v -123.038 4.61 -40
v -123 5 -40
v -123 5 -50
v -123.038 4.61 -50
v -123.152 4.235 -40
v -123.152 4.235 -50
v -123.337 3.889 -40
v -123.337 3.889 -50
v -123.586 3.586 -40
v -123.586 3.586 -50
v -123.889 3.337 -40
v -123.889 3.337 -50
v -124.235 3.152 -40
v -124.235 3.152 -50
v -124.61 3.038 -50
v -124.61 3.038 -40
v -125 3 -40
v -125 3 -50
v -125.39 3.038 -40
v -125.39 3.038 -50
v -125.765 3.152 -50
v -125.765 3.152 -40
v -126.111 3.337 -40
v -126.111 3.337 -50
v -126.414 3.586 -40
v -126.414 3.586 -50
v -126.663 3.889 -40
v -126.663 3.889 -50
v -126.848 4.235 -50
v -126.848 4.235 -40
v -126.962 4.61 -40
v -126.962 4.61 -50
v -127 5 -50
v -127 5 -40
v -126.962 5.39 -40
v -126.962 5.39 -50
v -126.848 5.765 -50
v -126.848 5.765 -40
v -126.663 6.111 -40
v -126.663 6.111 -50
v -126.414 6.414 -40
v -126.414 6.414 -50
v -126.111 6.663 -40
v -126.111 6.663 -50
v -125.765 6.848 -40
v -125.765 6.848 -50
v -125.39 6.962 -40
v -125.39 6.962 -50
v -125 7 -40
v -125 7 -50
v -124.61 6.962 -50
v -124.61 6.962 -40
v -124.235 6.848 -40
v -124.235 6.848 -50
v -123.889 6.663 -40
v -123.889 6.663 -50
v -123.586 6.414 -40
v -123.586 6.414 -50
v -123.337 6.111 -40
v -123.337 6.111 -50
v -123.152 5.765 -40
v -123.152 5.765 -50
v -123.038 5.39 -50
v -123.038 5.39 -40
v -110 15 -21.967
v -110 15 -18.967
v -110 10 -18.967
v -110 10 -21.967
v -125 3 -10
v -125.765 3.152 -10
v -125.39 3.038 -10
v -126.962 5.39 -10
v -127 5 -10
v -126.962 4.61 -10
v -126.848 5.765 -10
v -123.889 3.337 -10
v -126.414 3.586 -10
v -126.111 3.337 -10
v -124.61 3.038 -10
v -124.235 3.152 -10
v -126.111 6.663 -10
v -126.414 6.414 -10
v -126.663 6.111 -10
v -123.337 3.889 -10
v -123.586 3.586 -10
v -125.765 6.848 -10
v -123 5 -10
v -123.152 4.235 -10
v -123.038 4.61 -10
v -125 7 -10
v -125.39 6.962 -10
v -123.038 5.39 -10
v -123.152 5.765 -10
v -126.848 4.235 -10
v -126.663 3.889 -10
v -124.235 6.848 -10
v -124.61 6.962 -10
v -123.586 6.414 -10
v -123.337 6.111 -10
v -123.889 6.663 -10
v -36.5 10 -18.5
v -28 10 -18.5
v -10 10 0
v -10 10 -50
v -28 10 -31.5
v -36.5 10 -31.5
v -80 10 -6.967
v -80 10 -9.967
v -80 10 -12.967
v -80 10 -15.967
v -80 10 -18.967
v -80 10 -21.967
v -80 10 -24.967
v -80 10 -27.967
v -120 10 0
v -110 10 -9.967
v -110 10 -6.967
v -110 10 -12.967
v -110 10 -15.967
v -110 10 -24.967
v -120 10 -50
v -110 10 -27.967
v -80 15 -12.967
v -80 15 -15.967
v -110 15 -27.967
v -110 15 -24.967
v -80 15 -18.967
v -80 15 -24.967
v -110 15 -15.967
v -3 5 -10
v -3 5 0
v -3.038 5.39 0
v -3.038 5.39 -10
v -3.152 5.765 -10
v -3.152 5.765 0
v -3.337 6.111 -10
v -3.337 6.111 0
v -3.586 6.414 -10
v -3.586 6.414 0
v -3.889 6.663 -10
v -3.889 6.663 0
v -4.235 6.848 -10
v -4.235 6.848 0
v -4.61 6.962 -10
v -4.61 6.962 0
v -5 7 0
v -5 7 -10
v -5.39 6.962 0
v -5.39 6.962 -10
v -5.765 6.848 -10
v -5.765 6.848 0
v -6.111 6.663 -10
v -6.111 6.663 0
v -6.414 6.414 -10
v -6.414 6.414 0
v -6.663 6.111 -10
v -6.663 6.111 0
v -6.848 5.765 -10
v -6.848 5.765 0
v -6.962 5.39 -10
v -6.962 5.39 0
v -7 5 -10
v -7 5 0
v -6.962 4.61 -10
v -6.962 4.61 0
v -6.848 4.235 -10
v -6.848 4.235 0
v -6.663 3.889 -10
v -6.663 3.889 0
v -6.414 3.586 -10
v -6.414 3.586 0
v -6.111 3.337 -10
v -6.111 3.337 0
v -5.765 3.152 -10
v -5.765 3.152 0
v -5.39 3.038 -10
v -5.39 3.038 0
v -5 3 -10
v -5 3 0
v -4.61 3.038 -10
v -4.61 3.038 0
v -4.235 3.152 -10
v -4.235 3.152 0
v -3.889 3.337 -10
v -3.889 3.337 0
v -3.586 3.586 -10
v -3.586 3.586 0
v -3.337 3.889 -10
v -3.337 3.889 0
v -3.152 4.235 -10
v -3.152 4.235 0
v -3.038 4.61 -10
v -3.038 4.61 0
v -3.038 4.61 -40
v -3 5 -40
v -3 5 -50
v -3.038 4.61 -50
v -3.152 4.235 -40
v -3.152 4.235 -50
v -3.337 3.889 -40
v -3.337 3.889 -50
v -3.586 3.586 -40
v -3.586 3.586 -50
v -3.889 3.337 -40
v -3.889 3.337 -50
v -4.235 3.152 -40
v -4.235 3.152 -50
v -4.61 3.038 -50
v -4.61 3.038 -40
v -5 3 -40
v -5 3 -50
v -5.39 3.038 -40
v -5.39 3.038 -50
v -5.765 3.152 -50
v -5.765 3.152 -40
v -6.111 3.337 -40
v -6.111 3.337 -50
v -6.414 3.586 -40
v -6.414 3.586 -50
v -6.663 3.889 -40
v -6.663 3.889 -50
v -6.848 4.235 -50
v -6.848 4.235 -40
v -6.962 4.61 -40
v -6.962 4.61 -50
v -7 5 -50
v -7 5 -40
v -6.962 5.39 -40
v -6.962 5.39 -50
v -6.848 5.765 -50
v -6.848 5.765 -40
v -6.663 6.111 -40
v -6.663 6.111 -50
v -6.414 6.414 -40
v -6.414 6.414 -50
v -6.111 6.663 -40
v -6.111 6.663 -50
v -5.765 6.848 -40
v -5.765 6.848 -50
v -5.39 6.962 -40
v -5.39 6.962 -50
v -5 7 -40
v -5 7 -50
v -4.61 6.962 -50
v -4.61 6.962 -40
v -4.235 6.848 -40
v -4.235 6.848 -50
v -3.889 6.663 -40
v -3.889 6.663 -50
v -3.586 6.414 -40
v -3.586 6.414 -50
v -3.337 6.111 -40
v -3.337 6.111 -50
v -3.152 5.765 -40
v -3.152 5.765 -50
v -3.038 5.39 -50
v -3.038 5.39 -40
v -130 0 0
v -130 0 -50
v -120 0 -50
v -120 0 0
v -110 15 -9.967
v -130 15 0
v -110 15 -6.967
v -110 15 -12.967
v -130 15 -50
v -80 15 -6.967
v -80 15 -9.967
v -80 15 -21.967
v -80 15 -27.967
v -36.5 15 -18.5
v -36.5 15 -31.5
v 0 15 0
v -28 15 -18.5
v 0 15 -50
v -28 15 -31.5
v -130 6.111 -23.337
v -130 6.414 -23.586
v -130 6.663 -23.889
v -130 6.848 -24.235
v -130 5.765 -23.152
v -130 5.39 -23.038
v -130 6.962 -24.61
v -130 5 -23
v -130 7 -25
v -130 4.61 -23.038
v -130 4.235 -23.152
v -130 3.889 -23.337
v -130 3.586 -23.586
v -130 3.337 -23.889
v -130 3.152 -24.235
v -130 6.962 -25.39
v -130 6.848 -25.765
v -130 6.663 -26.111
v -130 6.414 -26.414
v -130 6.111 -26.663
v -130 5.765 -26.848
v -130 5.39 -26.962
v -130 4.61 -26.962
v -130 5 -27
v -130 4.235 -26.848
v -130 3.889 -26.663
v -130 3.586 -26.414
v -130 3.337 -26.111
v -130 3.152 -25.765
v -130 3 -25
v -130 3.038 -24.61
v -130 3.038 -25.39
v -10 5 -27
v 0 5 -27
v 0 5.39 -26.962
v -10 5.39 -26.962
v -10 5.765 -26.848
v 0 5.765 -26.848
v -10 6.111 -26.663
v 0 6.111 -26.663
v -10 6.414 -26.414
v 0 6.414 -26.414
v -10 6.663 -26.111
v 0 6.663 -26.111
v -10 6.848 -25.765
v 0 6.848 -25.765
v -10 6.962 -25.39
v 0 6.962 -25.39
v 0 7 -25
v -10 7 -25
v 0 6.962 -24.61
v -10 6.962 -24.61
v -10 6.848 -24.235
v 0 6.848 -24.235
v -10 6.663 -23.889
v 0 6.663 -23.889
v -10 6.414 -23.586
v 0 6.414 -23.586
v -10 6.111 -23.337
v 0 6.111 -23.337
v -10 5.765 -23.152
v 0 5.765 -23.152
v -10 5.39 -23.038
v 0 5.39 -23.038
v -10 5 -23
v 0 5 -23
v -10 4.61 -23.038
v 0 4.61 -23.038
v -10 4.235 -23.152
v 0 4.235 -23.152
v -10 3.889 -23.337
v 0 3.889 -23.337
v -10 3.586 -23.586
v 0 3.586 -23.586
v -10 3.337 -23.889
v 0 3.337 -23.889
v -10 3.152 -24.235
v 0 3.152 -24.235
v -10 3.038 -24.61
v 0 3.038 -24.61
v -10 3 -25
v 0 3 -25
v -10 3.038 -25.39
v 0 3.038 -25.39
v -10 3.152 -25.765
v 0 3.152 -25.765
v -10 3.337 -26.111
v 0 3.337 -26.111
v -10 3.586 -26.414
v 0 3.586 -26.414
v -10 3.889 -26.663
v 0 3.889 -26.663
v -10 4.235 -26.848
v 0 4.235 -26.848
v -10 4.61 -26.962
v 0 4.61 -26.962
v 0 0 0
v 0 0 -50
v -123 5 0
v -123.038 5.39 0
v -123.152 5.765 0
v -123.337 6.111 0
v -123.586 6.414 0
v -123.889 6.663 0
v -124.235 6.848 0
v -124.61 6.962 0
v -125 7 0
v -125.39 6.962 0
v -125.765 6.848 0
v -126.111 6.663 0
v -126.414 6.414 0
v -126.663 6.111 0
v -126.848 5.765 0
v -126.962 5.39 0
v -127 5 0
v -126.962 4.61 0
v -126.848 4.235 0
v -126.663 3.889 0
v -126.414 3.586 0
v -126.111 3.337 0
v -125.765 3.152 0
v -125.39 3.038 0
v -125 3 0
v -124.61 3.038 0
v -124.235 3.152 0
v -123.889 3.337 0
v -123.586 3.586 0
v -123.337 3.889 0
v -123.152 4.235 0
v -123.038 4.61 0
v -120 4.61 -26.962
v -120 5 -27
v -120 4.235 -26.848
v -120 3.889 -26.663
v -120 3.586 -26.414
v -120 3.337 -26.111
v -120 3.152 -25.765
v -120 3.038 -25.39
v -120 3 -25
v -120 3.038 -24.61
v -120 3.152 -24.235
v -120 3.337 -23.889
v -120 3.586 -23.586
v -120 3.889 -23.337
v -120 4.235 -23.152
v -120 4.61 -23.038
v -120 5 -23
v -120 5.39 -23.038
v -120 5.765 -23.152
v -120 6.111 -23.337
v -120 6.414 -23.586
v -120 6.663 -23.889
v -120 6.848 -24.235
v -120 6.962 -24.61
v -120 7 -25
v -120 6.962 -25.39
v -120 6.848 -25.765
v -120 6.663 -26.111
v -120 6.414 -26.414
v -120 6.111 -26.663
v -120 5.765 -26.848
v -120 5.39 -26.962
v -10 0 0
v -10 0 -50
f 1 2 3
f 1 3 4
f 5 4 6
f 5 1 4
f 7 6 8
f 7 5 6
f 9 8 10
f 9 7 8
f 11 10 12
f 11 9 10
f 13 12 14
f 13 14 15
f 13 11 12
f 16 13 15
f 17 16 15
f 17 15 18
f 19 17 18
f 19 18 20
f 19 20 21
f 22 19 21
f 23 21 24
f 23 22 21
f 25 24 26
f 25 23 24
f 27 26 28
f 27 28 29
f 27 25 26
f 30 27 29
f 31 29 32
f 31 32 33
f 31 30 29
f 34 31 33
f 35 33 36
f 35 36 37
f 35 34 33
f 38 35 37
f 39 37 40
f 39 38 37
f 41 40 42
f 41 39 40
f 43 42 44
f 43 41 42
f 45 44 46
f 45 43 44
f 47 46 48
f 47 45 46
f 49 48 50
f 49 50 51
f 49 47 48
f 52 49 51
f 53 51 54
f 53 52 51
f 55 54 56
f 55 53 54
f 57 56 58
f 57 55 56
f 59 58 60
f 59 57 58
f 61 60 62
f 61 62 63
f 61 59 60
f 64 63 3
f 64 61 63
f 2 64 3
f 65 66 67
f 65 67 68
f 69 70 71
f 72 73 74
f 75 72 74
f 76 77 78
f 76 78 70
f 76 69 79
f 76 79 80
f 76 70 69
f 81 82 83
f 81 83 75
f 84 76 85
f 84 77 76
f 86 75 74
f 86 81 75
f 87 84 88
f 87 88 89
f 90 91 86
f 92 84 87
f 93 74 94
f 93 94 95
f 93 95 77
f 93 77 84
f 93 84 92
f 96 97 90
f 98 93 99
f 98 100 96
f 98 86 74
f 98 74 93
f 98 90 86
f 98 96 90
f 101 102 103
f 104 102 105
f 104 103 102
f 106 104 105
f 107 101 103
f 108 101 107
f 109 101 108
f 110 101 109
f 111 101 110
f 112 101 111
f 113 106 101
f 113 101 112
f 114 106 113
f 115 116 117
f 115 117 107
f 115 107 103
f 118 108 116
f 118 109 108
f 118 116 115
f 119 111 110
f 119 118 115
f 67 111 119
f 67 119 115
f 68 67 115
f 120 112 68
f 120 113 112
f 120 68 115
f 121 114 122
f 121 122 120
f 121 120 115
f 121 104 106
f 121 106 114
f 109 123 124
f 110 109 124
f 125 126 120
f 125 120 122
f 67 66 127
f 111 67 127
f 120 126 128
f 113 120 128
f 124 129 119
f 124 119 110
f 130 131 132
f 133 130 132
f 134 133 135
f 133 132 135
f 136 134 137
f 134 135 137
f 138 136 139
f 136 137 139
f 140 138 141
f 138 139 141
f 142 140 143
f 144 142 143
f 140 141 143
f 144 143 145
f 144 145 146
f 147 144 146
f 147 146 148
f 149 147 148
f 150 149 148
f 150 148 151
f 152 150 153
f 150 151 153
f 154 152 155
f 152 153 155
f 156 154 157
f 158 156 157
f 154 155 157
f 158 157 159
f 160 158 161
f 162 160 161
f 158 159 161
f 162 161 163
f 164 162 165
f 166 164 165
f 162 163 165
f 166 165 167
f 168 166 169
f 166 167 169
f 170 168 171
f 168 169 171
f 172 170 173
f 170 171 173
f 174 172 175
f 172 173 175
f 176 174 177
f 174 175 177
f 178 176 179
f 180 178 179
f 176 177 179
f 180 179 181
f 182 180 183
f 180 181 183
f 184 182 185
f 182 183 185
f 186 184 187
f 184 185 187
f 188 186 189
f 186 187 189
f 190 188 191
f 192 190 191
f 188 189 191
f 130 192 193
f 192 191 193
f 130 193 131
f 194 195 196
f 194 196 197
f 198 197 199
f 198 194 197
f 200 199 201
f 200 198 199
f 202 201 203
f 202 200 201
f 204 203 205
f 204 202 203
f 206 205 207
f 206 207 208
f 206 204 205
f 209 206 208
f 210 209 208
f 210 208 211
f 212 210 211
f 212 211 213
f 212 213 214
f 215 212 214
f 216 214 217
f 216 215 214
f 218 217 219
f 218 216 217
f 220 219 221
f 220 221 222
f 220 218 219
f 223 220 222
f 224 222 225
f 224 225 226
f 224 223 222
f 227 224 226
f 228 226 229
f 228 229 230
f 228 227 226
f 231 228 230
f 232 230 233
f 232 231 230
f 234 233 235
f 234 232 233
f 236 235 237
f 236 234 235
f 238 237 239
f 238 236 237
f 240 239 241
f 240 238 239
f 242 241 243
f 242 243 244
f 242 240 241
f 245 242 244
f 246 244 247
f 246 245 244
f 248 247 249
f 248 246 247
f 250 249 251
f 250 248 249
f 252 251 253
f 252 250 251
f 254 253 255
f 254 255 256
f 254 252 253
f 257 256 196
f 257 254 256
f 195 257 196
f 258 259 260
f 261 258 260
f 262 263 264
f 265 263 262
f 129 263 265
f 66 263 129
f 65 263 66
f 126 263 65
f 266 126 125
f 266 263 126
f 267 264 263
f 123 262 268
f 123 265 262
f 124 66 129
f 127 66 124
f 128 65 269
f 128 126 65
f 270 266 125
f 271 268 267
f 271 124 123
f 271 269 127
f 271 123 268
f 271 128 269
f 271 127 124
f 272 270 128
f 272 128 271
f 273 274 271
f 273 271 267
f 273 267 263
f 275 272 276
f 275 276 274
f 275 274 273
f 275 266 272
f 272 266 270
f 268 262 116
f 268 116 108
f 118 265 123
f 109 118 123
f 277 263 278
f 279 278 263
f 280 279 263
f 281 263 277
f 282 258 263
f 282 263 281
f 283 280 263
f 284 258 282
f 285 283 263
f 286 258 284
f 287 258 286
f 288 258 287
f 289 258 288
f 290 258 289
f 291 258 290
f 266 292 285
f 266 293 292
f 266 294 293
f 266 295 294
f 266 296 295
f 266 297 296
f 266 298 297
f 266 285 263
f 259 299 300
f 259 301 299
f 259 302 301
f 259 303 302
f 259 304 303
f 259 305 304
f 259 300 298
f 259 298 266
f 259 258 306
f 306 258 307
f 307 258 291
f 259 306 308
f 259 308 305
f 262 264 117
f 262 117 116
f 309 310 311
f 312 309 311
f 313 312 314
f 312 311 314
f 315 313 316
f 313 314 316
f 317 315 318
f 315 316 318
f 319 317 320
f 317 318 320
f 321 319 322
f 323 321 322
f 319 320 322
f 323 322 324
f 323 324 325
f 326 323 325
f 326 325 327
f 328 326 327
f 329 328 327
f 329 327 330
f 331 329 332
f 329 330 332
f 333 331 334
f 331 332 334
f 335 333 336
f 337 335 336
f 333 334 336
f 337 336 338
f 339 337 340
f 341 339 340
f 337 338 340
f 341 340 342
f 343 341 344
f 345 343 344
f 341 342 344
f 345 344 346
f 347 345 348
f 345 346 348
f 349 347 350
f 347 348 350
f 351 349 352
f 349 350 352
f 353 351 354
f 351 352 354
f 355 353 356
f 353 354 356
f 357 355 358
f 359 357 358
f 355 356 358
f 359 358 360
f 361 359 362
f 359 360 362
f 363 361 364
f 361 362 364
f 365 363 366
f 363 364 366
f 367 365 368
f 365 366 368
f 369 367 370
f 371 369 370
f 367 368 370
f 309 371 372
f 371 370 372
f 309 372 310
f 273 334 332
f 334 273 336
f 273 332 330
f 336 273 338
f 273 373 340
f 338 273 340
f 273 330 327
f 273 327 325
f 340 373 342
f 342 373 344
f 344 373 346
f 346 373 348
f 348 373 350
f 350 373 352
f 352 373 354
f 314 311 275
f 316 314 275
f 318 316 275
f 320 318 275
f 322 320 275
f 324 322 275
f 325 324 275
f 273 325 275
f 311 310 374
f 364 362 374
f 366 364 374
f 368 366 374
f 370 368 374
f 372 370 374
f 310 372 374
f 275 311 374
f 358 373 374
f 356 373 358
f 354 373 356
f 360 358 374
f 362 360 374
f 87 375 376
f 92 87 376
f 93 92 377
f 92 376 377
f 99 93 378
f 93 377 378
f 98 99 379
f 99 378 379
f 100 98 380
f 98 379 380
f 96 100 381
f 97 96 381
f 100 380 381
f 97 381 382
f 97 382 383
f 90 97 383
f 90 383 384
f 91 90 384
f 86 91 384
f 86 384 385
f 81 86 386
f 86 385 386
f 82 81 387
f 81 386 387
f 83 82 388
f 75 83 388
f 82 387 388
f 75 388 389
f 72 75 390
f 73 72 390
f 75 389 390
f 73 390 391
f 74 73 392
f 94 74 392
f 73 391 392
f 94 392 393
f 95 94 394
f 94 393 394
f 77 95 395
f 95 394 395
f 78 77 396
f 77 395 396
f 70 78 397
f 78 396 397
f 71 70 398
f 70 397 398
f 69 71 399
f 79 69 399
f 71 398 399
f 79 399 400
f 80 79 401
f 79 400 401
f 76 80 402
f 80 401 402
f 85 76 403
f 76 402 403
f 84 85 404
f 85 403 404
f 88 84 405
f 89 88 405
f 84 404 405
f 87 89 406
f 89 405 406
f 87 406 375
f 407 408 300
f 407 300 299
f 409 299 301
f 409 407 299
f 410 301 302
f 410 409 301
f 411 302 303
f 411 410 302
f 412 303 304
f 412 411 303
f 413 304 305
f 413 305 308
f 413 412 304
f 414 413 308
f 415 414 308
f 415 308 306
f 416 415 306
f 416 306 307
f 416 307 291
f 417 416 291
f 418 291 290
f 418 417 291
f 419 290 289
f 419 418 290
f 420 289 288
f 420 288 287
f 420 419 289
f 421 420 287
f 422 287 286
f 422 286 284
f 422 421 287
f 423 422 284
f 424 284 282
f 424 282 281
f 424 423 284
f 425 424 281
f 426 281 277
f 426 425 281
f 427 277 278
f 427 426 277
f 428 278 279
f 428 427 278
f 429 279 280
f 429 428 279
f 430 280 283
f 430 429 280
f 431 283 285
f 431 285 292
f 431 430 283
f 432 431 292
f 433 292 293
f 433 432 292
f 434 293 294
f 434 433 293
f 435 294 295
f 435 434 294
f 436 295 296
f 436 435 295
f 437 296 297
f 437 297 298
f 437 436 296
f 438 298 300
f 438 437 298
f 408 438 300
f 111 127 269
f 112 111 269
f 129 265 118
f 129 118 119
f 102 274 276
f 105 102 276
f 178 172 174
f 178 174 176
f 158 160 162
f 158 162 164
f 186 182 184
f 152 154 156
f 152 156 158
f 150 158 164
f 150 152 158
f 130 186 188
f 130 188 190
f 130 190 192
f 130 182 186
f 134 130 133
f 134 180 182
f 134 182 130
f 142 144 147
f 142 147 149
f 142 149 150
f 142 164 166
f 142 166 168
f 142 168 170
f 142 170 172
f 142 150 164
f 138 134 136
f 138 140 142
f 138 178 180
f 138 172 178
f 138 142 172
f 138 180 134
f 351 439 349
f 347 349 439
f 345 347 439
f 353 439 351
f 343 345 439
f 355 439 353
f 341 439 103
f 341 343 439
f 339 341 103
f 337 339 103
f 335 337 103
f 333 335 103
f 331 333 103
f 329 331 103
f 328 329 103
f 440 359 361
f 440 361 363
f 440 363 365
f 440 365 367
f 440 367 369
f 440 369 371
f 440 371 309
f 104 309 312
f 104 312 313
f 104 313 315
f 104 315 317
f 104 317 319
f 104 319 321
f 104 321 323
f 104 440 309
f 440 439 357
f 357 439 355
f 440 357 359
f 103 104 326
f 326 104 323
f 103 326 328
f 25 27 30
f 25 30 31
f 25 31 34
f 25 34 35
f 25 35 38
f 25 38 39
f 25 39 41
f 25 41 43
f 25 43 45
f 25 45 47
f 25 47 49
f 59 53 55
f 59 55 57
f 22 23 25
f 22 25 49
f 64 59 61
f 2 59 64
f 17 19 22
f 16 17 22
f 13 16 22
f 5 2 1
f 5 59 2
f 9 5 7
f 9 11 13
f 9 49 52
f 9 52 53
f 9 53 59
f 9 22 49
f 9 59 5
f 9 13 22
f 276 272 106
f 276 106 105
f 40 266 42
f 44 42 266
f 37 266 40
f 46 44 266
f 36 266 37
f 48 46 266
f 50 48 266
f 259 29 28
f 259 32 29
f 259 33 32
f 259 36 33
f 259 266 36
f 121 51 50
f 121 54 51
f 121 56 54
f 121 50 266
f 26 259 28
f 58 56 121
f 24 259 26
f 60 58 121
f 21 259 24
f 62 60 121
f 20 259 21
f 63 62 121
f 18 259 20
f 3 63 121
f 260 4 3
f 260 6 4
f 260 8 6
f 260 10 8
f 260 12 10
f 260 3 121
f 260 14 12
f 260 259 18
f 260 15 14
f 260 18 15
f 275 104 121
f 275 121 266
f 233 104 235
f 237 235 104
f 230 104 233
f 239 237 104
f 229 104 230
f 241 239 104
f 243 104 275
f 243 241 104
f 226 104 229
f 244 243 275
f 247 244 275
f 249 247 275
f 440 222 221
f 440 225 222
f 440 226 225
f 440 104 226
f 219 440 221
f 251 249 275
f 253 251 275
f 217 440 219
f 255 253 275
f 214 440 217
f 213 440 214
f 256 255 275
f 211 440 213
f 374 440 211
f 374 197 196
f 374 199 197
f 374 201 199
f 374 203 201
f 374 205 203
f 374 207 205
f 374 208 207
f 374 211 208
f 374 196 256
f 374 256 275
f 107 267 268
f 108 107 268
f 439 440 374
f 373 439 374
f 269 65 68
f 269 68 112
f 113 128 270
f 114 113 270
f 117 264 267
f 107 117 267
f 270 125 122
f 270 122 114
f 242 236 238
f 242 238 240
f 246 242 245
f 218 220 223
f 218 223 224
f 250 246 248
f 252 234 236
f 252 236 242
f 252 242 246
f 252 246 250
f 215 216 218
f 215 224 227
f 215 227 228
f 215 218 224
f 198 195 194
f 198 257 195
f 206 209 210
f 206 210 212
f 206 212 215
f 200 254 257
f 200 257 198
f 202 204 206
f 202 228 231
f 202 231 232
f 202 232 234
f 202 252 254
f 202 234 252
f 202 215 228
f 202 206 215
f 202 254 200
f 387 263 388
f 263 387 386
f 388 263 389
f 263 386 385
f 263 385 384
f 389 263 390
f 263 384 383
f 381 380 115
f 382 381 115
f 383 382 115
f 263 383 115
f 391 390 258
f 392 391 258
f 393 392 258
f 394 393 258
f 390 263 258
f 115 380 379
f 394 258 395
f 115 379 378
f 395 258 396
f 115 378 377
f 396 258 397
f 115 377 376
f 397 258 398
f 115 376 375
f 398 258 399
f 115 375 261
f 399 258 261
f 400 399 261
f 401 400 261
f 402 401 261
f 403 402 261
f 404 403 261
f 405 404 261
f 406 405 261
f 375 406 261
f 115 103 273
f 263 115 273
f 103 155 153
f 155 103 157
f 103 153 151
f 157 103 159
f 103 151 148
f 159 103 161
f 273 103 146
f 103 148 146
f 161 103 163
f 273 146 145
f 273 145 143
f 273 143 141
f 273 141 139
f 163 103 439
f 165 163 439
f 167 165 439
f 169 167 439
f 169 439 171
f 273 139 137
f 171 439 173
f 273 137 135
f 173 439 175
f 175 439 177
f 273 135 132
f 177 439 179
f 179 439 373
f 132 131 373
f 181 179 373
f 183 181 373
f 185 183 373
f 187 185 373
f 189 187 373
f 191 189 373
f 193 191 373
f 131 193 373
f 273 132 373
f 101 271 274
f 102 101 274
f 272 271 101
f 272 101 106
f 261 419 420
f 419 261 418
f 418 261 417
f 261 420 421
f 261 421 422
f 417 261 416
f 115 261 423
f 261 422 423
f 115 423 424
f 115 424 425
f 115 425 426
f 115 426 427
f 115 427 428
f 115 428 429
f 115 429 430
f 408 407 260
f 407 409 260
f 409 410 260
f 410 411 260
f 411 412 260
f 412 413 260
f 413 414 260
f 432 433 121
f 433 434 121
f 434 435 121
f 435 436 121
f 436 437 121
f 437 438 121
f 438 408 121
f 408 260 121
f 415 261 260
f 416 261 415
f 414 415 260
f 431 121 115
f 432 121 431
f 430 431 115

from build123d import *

# Parameters (mm, degrees)
ESBO_O1_W                = 130
ESBO_O1_H                = 50
RESSALTO_EXTRUS_O1_DEPTH = 15
ESBO_O2_W                = 110
ESBO_O2_H                = 10
CORTE_EXTRUS_O1_DEPTH    = 51
ESBO_O12_R               = 2
CORTE_EXTRUS_O8_DEPTH    = 10
CORTE_EXTRUS_O9_START    = -10
ESBO_O14_R               = 2
CORTE_EXTRUS_O9_DEPTH    = 10
ESBO_O7_R                = 2
CORTE_EXTRUS_O11_DEPTH   = 10
CORTE_EXTRUS_O12_START   = -10
ESBO_O6_R                = 2
CORTE_EXTRUS_O12_DEPTH   = 10
ESBO_O23_W               = 8.5
ESBO_O23_H               = 13
CORTE_EXTRUS_O13_DEPTH   = 10
ESBO_O20_W               = 30
ESBO_O20_H               = 3
CORTE_EXTRUS_O14_DEPTH   = 10


with BuildPart() as part:
    # Esboço1 → Ressalto-extrusão1 (new body)
    with BuildSketch(Plane(origin=(0, 0, 0), x_dir=(1, 0, 0), z_dir=(0, 1, 0))):
        with Locations((-65, 25)):
            Rectangle(ESBO_O1_W, ESBO_O1_H)
    extrude(amount=RESSALTO_EXTRUS_O1_DEPTH)

    # Esboço2 → Corte-extrusão1 (cut)
    with BuildSketch(Plane(origin=(0, 0, -50), x_dir=(-1, 0, 0), z_dir=(0, 0, -1))):
        with Locations((65, 5)):
            Rectangle(ESBO_O2_W, ESBO_O2_H)
    extrude(amount=-CORTE_EXTRUS_O1_DEPTH, mode=Mode.SUBTRACT)

    # Esboço12 → Corte-extrusão8 (cut)
    with BuildSketch(Plane(origin=(0, 0, 0), x_dir=(0, 0, -1), z_dir=(1, 0, 0))):
        with Locations((25, 5)):
            Circle(ESBO_O12_R)
    extrude(amount=-CORTE_EXTRUS_O8_DEPTH, mode=Mode.SUBTRACT)

    # Esboço14 → Corte-extrusão9 (cut)
    with BuildSketch(Plane.ZY.offset(130).offset(CORTE_EXTRUS_O9_START)):
        with Locations(Location((-25, 5, 0), (0, 0, 180))):
            Circle(ESBO_O14_R)
    extrude(amount=CORTE_EXTRUS_O9_DEPTH, mode=Mode.SUBTRACT)

    # Esboço7 → Corte-extrusão11 (cut)
    with BuildSketch(Plane.XY):
        with Locations((-5, 5)):
            Circle(ESBO_O7_R)
        with Locations((-125, 5)):
            Circle(ESBO_O7_R)
    extrude(amount=-CORTE_EXTRUS_O11_DEPTH, mode=Mode.SUBTRACT)

    # Esboço6 → Corte-extrusão12 (cut)
    with BuildSketch(Plane(origin=(0, 0, -50), x_dir=(-1, 0, 0), z_dir=(0, 0, -1)).offset(CORTE_EXTRUS_O12_START)):
        with Locations(Location((5, 5, 0), (0, 0, 180))):
            Circle(ESBO_O6_R)
        with Locations(Location((125, 5, 0), (0, 0, 180))):
            Circle(ESBO_O6_R)
    extrude(amount=CORTE_EXTRUS_O12_DEPTH, mode=Mode.SUBTRACT)

    # Esboço23 → Corte-extrusão13 (cut)
    with BuildSketch(Plane(origin=(0, 15, 0), x_dir=(1, 0, 0), z_dir=(0, 1, 0))):
        with Locations((-32.25, 25)):
            Rectangle(ESBO_O23_W, ESBO_O23_H)
    extrude(amount=-CORTE_EXTRUS_O13_DEPTH, mode=Mode.SUBTRACT)

    # Esboço20 → Corte-extrusão14 (cut)
    with BuildSketch(Plane(origin=(0, 15, 0), x_dir=(1, 0, 0), z_dir=(0, 1, 0))):
        with Locations((-95, 20.466517667)):
            Rectangle(ESBO_O20_W, ESBO_O20_H)
        with Locations((-95, 8.466517667)):
            Rectangle(ESBO_O20_W, ESBO_O20_H)
        with Locations((-95, 26.466517667)):
            Rectangle(ESBO_O20_W, ESBO_O20_H)
        with Locations((-95, 14.466517667)):
            Rectangle(ESBO_O20_W, ESBO_O20_H)
    extrude(amount=-CORTE_EXTRUS_O14_DEPTH, mode=Mode.SUBTRACT)


solid = part.part
